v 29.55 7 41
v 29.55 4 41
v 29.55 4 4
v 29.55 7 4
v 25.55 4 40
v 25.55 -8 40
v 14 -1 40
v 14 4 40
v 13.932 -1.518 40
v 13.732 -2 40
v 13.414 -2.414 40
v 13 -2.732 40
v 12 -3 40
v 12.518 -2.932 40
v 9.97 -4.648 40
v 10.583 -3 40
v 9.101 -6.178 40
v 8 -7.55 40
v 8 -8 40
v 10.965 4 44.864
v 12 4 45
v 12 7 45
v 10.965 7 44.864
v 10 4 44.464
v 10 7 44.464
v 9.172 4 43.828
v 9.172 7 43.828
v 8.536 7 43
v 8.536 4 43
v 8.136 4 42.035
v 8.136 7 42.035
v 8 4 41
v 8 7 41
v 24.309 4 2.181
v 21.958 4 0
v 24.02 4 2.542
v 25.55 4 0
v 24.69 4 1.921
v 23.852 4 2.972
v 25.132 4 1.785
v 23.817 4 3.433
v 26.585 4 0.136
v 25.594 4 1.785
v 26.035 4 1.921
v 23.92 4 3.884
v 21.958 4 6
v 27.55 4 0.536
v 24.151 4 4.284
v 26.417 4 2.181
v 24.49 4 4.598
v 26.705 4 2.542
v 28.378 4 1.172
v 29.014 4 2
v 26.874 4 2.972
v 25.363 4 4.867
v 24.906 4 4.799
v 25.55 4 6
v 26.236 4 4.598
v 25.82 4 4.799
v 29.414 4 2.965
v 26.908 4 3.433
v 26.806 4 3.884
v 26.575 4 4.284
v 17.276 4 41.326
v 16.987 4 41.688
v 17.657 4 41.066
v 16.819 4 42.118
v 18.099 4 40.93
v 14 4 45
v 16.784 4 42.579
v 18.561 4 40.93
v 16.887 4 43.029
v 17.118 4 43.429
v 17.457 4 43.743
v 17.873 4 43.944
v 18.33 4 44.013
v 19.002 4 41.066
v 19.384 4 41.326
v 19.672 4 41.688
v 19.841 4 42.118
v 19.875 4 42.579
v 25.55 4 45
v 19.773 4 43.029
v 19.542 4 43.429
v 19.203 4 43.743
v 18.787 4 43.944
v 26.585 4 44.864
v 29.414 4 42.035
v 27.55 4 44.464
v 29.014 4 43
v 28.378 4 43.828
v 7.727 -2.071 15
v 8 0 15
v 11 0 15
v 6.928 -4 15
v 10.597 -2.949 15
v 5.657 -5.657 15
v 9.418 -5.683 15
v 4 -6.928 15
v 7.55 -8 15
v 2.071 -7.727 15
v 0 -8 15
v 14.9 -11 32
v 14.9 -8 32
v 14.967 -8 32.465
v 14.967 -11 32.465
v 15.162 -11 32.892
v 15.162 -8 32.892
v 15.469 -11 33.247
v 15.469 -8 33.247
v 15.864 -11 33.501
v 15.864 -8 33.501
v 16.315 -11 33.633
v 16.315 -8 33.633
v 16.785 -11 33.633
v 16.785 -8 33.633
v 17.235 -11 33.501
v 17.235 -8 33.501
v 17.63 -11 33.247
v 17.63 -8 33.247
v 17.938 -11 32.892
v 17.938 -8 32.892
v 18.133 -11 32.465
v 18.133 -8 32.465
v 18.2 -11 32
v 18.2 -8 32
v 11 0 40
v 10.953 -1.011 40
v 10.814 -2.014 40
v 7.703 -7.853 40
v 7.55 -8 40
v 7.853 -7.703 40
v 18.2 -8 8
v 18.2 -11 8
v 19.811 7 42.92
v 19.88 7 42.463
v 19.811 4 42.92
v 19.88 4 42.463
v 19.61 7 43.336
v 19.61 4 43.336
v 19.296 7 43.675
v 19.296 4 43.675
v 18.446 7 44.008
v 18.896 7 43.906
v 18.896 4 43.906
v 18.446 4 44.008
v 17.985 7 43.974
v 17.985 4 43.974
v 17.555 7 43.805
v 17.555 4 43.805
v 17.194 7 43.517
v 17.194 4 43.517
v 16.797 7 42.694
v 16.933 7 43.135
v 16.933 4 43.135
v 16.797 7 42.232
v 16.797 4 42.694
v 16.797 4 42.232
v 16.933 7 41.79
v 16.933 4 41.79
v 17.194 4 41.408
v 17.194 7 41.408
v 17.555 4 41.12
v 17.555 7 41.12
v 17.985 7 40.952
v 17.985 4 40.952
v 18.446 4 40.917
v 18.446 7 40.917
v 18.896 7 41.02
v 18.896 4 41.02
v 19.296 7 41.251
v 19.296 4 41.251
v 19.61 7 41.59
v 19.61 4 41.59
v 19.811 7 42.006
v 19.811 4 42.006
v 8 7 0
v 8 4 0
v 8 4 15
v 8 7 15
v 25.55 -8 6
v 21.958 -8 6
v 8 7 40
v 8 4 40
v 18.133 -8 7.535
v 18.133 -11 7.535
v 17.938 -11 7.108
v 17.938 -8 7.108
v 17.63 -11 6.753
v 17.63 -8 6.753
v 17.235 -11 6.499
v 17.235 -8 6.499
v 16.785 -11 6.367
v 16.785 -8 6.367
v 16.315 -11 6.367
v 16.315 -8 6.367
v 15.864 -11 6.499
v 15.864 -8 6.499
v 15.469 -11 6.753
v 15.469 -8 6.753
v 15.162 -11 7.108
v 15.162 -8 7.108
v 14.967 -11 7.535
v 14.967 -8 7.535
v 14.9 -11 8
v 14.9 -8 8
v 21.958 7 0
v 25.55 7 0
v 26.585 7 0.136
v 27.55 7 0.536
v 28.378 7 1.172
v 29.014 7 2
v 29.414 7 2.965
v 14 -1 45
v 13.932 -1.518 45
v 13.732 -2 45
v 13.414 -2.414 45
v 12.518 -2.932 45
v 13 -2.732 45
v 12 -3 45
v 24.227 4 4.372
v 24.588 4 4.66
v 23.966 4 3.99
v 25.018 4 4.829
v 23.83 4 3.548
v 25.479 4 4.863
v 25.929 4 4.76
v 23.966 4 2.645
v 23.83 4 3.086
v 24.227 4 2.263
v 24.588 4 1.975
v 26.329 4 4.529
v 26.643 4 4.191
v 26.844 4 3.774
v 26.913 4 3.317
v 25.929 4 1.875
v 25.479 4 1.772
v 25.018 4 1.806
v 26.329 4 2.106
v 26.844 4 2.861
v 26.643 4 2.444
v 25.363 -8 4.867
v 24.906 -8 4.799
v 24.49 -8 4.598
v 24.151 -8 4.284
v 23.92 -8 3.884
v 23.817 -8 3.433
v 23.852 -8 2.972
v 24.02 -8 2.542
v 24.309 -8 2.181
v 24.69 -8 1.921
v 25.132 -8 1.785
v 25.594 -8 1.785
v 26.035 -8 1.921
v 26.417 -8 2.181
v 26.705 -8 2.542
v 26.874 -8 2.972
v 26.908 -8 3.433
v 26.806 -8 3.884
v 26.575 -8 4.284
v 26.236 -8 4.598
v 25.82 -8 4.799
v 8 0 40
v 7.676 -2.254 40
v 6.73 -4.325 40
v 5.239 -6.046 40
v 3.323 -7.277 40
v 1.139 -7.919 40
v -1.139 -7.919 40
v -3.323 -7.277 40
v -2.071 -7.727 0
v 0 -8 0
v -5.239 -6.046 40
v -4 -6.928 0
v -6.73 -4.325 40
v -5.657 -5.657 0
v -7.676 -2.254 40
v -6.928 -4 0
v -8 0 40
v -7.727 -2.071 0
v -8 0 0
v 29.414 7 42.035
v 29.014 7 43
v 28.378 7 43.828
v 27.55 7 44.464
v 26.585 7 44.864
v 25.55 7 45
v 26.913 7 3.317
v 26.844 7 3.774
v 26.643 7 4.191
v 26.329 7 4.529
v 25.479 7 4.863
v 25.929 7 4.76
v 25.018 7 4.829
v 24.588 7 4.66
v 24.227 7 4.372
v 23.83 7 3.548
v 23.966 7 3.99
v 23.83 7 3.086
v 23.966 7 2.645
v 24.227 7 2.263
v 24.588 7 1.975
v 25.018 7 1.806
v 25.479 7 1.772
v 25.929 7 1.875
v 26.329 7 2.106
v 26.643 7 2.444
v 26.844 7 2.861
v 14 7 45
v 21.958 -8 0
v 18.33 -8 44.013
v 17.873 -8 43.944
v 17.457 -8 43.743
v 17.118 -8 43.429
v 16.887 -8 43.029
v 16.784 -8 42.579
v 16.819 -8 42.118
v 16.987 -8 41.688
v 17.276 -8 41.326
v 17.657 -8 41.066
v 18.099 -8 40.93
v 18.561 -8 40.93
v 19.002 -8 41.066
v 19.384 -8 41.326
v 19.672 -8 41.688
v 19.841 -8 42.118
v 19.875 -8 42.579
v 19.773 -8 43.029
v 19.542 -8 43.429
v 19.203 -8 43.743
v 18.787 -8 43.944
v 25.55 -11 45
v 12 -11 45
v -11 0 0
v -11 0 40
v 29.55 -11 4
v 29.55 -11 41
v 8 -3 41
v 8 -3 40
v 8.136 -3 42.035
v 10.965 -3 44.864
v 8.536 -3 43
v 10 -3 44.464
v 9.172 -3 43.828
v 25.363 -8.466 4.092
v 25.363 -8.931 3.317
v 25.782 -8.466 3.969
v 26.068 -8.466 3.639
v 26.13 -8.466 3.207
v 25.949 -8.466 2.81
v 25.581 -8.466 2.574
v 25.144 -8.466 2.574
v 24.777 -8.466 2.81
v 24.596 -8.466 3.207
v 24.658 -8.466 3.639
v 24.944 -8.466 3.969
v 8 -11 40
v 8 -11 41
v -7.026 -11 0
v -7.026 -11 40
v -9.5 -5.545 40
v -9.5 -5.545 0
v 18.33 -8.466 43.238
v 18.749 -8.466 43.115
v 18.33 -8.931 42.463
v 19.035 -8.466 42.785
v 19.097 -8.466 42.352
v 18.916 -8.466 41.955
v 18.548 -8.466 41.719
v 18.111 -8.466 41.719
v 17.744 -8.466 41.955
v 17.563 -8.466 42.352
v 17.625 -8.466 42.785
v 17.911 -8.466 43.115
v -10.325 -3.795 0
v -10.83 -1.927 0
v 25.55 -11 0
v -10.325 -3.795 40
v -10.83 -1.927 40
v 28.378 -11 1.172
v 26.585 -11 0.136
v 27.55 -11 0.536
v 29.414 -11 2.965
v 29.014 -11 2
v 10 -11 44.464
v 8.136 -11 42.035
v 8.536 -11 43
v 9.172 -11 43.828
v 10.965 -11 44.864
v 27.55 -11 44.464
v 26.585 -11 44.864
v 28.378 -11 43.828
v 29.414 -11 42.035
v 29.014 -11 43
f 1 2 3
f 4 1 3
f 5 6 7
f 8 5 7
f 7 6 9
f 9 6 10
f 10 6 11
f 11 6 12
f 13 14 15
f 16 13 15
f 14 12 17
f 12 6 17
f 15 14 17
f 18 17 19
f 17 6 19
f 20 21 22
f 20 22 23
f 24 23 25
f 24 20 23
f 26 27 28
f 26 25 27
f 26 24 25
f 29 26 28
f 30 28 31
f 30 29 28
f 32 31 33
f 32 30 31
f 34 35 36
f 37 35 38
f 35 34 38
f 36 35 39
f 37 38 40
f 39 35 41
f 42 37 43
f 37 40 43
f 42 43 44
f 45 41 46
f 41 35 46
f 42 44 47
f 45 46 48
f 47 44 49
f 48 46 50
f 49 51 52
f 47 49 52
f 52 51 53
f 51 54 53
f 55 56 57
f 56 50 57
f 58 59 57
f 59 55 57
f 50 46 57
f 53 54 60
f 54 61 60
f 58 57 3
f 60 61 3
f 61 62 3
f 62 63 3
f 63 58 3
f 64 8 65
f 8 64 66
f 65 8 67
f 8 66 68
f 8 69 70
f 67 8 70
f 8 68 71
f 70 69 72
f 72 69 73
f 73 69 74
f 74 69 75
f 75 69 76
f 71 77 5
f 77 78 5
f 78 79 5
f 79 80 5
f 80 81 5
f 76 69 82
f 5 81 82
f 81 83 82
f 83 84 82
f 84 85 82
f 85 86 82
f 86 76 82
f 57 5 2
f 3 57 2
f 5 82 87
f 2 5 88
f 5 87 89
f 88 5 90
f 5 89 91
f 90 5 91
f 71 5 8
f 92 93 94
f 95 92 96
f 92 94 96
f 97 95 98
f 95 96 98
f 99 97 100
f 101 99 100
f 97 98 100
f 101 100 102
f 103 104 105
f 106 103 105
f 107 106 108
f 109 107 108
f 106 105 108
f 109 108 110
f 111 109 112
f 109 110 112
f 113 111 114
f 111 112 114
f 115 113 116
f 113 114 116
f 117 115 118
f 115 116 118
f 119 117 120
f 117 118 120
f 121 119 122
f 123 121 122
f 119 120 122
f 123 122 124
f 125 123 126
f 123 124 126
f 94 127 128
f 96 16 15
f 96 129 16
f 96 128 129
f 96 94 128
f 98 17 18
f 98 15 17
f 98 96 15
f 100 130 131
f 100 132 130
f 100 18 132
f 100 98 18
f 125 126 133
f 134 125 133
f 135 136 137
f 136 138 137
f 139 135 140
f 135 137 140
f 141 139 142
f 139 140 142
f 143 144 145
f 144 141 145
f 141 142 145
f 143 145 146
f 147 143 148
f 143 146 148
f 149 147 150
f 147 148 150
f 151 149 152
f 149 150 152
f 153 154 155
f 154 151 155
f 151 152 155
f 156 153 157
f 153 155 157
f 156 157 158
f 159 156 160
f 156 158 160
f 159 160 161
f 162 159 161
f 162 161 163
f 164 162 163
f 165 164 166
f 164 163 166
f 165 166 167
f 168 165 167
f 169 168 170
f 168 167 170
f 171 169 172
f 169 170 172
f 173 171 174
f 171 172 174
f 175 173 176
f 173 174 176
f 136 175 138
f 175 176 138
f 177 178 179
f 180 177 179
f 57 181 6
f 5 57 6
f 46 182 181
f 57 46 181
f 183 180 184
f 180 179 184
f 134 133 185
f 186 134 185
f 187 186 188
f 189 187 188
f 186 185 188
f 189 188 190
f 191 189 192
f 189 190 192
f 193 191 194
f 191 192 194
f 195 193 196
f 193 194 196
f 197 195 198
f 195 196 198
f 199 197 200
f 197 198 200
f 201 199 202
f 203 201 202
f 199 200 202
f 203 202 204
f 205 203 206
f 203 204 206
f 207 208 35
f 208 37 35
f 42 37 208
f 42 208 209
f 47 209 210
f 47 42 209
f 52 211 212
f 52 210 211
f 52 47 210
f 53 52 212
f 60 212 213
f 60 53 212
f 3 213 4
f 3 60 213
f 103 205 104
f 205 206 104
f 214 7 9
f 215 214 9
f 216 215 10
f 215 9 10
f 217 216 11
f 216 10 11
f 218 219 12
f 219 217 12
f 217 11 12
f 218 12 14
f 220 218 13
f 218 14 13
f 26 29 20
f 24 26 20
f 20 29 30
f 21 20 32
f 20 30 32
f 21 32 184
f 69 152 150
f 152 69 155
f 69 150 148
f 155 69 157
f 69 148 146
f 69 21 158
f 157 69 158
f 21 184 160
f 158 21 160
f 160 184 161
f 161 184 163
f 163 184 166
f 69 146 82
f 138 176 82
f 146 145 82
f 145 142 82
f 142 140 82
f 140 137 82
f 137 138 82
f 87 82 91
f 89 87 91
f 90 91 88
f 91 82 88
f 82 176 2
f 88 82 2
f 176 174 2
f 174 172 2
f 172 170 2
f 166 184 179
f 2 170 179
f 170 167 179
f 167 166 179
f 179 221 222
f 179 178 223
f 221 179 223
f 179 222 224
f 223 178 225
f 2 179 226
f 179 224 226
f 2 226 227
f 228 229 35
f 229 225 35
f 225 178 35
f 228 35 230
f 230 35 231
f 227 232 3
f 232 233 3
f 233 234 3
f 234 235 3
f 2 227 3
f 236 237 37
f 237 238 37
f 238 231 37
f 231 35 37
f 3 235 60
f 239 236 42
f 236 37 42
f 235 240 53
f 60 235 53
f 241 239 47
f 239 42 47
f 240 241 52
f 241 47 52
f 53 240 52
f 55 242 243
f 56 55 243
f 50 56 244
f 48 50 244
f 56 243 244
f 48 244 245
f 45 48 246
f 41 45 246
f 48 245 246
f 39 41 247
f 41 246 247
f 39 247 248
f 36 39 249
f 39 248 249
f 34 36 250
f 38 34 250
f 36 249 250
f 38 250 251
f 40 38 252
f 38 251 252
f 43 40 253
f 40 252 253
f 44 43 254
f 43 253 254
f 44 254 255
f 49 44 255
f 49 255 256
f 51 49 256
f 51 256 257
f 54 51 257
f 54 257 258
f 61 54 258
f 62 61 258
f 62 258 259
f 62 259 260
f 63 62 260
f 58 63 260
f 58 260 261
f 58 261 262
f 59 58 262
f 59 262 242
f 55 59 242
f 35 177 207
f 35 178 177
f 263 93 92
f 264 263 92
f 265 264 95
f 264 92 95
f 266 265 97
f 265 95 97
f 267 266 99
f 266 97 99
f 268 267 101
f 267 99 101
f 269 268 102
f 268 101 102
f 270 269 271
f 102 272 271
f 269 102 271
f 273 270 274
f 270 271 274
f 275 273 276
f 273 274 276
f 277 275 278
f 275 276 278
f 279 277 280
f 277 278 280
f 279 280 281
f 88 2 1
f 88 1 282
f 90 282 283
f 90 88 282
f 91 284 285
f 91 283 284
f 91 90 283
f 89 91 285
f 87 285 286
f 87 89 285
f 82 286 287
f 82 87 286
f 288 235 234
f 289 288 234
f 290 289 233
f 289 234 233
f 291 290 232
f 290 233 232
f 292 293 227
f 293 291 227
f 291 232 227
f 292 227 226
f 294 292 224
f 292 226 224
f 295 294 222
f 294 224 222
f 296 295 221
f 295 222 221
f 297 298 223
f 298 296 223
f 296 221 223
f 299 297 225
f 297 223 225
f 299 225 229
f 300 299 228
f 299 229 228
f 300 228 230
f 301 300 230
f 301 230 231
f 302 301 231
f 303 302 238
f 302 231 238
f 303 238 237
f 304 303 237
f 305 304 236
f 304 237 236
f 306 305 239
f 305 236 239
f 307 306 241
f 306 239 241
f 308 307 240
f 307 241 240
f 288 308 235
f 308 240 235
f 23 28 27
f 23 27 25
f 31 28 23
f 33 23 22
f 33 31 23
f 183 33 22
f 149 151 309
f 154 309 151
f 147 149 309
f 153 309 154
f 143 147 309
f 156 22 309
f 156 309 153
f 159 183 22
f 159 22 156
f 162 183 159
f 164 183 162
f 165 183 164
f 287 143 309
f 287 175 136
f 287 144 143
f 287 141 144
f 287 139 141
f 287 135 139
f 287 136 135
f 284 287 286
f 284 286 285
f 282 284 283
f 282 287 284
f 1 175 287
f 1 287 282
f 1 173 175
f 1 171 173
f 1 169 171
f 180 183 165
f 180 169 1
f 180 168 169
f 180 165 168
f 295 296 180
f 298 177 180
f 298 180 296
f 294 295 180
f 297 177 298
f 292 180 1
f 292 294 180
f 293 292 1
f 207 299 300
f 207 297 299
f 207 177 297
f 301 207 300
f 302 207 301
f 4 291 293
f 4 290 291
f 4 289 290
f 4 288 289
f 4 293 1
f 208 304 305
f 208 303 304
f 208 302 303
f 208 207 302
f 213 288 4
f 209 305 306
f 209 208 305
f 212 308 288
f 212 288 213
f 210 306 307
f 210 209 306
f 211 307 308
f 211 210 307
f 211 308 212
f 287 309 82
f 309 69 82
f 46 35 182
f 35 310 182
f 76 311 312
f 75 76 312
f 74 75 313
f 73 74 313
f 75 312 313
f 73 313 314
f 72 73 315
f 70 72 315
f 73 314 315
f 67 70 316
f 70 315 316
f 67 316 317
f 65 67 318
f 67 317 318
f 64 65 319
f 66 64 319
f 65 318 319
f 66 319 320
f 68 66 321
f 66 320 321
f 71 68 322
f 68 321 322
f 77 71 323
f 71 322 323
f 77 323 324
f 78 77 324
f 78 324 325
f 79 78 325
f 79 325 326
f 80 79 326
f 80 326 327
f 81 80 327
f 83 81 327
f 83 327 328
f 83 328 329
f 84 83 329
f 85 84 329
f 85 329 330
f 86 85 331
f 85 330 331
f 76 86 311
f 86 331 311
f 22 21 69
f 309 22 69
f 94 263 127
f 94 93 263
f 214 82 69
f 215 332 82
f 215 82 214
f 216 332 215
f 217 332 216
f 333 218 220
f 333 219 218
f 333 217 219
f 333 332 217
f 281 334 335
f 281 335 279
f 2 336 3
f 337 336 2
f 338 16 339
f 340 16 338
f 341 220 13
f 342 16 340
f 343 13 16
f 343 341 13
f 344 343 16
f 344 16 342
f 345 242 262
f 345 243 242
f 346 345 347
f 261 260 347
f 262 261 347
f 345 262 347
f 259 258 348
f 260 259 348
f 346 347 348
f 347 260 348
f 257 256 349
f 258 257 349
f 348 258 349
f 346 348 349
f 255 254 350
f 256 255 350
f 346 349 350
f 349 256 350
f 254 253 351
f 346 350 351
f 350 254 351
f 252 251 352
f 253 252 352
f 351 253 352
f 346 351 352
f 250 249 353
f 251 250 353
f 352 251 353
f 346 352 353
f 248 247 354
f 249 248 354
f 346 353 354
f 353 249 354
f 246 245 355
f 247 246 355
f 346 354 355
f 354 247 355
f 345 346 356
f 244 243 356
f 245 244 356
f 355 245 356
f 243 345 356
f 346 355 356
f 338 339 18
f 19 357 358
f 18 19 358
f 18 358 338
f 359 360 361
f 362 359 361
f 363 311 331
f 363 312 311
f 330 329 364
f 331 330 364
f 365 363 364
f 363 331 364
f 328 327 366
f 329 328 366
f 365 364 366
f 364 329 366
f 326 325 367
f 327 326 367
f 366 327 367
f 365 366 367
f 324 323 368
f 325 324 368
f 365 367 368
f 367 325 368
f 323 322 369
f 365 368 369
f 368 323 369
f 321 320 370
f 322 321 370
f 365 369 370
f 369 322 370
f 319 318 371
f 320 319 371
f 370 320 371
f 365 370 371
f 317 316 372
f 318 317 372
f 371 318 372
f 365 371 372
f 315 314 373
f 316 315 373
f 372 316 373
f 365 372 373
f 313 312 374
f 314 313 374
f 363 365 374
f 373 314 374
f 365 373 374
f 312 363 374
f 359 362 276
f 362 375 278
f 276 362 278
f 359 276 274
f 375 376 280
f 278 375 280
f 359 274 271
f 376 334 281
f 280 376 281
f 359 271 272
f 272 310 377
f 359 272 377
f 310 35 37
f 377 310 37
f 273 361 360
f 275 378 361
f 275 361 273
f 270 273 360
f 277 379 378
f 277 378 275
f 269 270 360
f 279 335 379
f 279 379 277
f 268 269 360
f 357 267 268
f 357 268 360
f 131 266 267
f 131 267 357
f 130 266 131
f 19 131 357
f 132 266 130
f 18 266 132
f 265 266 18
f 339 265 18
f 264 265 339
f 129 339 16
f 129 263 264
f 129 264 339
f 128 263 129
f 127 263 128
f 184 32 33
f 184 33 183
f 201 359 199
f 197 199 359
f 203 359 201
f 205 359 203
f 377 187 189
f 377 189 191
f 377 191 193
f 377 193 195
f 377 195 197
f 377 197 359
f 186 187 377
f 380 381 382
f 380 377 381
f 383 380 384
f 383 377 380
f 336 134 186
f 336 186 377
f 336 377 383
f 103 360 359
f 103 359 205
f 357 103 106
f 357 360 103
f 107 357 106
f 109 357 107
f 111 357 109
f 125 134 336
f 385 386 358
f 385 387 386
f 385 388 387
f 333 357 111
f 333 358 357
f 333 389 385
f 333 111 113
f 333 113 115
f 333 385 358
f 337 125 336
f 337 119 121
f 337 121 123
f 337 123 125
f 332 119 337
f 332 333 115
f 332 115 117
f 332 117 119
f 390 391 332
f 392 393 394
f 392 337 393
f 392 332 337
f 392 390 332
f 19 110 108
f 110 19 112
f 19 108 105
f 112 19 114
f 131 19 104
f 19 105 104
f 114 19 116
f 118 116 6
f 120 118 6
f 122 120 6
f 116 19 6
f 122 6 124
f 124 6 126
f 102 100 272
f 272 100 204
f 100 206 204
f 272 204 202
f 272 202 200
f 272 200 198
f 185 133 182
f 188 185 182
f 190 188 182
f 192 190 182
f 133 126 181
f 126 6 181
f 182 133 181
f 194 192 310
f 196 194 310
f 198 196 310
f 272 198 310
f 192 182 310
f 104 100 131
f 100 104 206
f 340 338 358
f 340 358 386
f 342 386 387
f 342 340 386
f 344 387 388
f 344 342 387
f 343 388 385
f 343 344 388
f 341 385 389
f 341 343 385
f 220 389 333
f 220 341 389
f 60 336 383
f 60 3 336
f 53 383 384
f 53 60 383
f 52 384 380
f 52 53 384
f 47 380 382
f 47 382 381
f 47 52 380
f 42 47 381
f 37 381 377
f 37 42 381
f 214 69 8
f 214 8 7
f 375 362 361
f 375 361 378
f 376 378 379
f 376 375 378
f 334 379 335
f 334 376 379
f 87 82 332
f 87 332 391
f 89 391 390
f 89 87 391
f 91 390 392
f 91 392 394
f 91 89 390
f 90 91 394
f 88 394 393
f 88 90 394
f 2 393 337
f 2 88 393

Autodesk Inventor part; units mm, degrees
ref_plane "YZ Plane" through (0, 0, 0) normal (1, 0, 0) x (0, 1, 0)
ref_plane "XZ Plane" through (0, 0, 0) normal (0, 1, 0) x (-1, 0, 0)
sketch "Sketch4" plane through (0, 0, 0) normal (0, 0, 1) x (1, 0, 0)
  arc A0 (-8, 0) -> (8, 0) centre (0, 0) ccw
  line L0 (-11, 0) -> (-8, 0)
  line L1 (7.5498, -8) -> (25.5498, -8)
  line L2 (25.5498, -8) -> (25.5498, -11)
  arc A1 (-11, 0) -> (-9.5, -5.5453) centre (0, 0) ccw
  arc A2 (7.5498, -8) -> (11, 0) centre (0, 0) ccw
  line L3 (8, 0) -> (11, 0)
  line L4 (-7.0263, -11) -> (-9.5, -5.5453)
  line L5 (-7.0263, -11) -> (25.5498, -11)
  dimension "d0" = 16
  dimension "d14" = 18
  dimension "d15" = 3
  dimension "d20" = 3
extrude "Extrusion1" add sketch "Sketch4" along normal blind 40
sketch "Sketch5" plane through (7.5498, -8, 0) normal (0, 1, 0) x (1, 0, 0)
  line L0 (0, 0) -> (18, 0) projected
  line L1 (0, 0) -> (0, -40) projected
  line L2 (18, -40) -> (0, -40) projected
  line L3 (18, 0) -> (18, -40) projected
  line L4 (9, -32) -> (9, -8) construction
  line L5 (10.65, -32) -> (10.65, -8)
  line L6 (7.35, -8) -> (7.35, -32)
  arc A0 (7.35, -32) -> (10.65, -32) centre (9, -32) ccw
  arc A1 (10.65, -8) -> (7.35, -8) centre (9, -8) ccw
  point P0 (-7.5498, 0)
  point P1 (9, -20)
  point P2 (18, -20)
  dimension "d5" = 9
  dimension "d16" = 12
  dimension "d17" = 3.3
extrude "Extrusion2" cut sketch "Sketch5" against normal through all contours A0 L6 A1 L5
ref_plane "Work Plane1" through (25.5498, -11, 8) normal (1, 0, 0) x (0, 0, -1)
sketch "Sketch7" plane through (25.5498, -11, 8) normal (1, 0, 0) x (0, 0, -1)
  line L0 (0, 3) -> (8, 3)
  line L1 (8, 11) -> (-7, 11)
  line L2 (-7, 11) -> (-7, 3)
  line L3 (-7, 3) -> (8, 3)
  line L4 (8, 3) -> (8, 11)
  dimension "d22" = 15
extrude "Extrusion3" cut sketch "Sketch7" against normal up to surface
sketch "Sketch8" plane through (-7.0263, -11, 0) normal (0, -1, 0) x (1, 0, 0)
  line L0 (32.5762, 0) -> (32.5762, 40) construction
  line L1 (32.5762, 40) -> (14.5762, 40) projected
  line L2 (36.5762, 0) -> (36.5762, 45)
  line L3 (36.5762, 45) -> (15.0263, 45)
  line L4 (36.5762, 0) -> (28.9847, 0)
  line L5 (28.9847, 0) -> (28.9847, 6)
  line L6 (28.9847, 6) -> (32.5762, 6)
  line L7 (32.5762, 6) -> (32.5762, 40)
  line L8 (15.0263, 15) -> (15.0263, 40) projected
  line L9 (15.0263, 40) -> (15.0263, 45)
  point P0 (7.0263, 0)
  dimension "d25" = 4
  dimension "d26" = 6
  dimension "d27" = 5
extrude "Extrusion4" add sketch "Sketch8" against normal blind 15
sketch "Sketch9" plane through (8, -11, 45) normal (0, 0, 1) x (1, 0, 0)
  line L0 (0, 15) -> (21.5498, 15) projected
  line L1 (0, 0) -> (0, 15) projected
  line L2 (0, 15) -> (6, 15)
  line L3 (6, 15) -> (6, 8)
  line L4 (6, 8) -> (0, 8)
  line L5 (0, 8) -> (0, 15)
  point P0 (-8, 11)
  dimension "d30" = 6
  dimension "d31" = 7
extrude "Extrusion5" cut sketch "Sketch9" against normal up to surface (5 mm away)
fillet "Fillet2" radius 2 1 edges at (14, -3, 42.5)
fillet "Fillet3" radius 4 3 edges at (29.5498, -3.5, 45) (29.5498, -3.5, 0) (8, -7, 45)
sketch "Sketch10" plane through (-7.0263, 4, 0) normal (0, 1, 0) x (1, 0, 0)
  line L0 (28.9847, 0) -> (28.9847, -6) projected
  line L1 (21.0263, -40) -> (21.0263, -45) projected
  point P0 (7.0263, 0)
  point P1 (32.3891, -3.3174)
  point P2 (25.3561, -42.4627)
hole "Hole2" at (25.3628, 4, 3.3174) at (18.3298, 4, 42.4627) direction (0, -1, 0) diameter 3.1 depth 12 tip angle 118
sketch "Sketch11" plane through (-7.0263, 4, 0) normal (0, 1, 0) x (1, 0, 0)
  line L0 (36.5762, -41) -> (36.5762, -4) projected
  arc A0 (32.5762, -45) -> (36.5762, -41) centre (32.5762, -41) ccw projected
  line L1 (21.0263, -45) -> (32.5762, -45) projected
  arc A1 (36.5762, -4) -> (32.5762, 0) centre (32.5762, -4) ccw projected
  line L2 (32.5762, 0) -> (28.9847, 0) projected
  line L3 (15.0263, -15) -> (15.0263, -40) projected
  line L4 (15.0263, 0) -> (28.9847, 0)
  arc A2 (15.0263, -41) -> (19.0263, -45) centre (19.0263, -41) ccw projected
  line L5 (15.0263, -41) -> (15.0263, -40) projected
  line L6 (19.0263, -45) -> (21.0263, -45) projected
  line L7 (15.0263, 0) -> (15.0263, -15)
  circle A3 centre (32.3891, -3.3174) radius 1.55 projected
  circle A4 centre (25.3561, -42.4627) radius 1.55 projected
  point P0 (7.0263, 0)
extrude "Extrusion6" add sketch "Sketch11" along normal blind 3 separate body
properties part number "br"
